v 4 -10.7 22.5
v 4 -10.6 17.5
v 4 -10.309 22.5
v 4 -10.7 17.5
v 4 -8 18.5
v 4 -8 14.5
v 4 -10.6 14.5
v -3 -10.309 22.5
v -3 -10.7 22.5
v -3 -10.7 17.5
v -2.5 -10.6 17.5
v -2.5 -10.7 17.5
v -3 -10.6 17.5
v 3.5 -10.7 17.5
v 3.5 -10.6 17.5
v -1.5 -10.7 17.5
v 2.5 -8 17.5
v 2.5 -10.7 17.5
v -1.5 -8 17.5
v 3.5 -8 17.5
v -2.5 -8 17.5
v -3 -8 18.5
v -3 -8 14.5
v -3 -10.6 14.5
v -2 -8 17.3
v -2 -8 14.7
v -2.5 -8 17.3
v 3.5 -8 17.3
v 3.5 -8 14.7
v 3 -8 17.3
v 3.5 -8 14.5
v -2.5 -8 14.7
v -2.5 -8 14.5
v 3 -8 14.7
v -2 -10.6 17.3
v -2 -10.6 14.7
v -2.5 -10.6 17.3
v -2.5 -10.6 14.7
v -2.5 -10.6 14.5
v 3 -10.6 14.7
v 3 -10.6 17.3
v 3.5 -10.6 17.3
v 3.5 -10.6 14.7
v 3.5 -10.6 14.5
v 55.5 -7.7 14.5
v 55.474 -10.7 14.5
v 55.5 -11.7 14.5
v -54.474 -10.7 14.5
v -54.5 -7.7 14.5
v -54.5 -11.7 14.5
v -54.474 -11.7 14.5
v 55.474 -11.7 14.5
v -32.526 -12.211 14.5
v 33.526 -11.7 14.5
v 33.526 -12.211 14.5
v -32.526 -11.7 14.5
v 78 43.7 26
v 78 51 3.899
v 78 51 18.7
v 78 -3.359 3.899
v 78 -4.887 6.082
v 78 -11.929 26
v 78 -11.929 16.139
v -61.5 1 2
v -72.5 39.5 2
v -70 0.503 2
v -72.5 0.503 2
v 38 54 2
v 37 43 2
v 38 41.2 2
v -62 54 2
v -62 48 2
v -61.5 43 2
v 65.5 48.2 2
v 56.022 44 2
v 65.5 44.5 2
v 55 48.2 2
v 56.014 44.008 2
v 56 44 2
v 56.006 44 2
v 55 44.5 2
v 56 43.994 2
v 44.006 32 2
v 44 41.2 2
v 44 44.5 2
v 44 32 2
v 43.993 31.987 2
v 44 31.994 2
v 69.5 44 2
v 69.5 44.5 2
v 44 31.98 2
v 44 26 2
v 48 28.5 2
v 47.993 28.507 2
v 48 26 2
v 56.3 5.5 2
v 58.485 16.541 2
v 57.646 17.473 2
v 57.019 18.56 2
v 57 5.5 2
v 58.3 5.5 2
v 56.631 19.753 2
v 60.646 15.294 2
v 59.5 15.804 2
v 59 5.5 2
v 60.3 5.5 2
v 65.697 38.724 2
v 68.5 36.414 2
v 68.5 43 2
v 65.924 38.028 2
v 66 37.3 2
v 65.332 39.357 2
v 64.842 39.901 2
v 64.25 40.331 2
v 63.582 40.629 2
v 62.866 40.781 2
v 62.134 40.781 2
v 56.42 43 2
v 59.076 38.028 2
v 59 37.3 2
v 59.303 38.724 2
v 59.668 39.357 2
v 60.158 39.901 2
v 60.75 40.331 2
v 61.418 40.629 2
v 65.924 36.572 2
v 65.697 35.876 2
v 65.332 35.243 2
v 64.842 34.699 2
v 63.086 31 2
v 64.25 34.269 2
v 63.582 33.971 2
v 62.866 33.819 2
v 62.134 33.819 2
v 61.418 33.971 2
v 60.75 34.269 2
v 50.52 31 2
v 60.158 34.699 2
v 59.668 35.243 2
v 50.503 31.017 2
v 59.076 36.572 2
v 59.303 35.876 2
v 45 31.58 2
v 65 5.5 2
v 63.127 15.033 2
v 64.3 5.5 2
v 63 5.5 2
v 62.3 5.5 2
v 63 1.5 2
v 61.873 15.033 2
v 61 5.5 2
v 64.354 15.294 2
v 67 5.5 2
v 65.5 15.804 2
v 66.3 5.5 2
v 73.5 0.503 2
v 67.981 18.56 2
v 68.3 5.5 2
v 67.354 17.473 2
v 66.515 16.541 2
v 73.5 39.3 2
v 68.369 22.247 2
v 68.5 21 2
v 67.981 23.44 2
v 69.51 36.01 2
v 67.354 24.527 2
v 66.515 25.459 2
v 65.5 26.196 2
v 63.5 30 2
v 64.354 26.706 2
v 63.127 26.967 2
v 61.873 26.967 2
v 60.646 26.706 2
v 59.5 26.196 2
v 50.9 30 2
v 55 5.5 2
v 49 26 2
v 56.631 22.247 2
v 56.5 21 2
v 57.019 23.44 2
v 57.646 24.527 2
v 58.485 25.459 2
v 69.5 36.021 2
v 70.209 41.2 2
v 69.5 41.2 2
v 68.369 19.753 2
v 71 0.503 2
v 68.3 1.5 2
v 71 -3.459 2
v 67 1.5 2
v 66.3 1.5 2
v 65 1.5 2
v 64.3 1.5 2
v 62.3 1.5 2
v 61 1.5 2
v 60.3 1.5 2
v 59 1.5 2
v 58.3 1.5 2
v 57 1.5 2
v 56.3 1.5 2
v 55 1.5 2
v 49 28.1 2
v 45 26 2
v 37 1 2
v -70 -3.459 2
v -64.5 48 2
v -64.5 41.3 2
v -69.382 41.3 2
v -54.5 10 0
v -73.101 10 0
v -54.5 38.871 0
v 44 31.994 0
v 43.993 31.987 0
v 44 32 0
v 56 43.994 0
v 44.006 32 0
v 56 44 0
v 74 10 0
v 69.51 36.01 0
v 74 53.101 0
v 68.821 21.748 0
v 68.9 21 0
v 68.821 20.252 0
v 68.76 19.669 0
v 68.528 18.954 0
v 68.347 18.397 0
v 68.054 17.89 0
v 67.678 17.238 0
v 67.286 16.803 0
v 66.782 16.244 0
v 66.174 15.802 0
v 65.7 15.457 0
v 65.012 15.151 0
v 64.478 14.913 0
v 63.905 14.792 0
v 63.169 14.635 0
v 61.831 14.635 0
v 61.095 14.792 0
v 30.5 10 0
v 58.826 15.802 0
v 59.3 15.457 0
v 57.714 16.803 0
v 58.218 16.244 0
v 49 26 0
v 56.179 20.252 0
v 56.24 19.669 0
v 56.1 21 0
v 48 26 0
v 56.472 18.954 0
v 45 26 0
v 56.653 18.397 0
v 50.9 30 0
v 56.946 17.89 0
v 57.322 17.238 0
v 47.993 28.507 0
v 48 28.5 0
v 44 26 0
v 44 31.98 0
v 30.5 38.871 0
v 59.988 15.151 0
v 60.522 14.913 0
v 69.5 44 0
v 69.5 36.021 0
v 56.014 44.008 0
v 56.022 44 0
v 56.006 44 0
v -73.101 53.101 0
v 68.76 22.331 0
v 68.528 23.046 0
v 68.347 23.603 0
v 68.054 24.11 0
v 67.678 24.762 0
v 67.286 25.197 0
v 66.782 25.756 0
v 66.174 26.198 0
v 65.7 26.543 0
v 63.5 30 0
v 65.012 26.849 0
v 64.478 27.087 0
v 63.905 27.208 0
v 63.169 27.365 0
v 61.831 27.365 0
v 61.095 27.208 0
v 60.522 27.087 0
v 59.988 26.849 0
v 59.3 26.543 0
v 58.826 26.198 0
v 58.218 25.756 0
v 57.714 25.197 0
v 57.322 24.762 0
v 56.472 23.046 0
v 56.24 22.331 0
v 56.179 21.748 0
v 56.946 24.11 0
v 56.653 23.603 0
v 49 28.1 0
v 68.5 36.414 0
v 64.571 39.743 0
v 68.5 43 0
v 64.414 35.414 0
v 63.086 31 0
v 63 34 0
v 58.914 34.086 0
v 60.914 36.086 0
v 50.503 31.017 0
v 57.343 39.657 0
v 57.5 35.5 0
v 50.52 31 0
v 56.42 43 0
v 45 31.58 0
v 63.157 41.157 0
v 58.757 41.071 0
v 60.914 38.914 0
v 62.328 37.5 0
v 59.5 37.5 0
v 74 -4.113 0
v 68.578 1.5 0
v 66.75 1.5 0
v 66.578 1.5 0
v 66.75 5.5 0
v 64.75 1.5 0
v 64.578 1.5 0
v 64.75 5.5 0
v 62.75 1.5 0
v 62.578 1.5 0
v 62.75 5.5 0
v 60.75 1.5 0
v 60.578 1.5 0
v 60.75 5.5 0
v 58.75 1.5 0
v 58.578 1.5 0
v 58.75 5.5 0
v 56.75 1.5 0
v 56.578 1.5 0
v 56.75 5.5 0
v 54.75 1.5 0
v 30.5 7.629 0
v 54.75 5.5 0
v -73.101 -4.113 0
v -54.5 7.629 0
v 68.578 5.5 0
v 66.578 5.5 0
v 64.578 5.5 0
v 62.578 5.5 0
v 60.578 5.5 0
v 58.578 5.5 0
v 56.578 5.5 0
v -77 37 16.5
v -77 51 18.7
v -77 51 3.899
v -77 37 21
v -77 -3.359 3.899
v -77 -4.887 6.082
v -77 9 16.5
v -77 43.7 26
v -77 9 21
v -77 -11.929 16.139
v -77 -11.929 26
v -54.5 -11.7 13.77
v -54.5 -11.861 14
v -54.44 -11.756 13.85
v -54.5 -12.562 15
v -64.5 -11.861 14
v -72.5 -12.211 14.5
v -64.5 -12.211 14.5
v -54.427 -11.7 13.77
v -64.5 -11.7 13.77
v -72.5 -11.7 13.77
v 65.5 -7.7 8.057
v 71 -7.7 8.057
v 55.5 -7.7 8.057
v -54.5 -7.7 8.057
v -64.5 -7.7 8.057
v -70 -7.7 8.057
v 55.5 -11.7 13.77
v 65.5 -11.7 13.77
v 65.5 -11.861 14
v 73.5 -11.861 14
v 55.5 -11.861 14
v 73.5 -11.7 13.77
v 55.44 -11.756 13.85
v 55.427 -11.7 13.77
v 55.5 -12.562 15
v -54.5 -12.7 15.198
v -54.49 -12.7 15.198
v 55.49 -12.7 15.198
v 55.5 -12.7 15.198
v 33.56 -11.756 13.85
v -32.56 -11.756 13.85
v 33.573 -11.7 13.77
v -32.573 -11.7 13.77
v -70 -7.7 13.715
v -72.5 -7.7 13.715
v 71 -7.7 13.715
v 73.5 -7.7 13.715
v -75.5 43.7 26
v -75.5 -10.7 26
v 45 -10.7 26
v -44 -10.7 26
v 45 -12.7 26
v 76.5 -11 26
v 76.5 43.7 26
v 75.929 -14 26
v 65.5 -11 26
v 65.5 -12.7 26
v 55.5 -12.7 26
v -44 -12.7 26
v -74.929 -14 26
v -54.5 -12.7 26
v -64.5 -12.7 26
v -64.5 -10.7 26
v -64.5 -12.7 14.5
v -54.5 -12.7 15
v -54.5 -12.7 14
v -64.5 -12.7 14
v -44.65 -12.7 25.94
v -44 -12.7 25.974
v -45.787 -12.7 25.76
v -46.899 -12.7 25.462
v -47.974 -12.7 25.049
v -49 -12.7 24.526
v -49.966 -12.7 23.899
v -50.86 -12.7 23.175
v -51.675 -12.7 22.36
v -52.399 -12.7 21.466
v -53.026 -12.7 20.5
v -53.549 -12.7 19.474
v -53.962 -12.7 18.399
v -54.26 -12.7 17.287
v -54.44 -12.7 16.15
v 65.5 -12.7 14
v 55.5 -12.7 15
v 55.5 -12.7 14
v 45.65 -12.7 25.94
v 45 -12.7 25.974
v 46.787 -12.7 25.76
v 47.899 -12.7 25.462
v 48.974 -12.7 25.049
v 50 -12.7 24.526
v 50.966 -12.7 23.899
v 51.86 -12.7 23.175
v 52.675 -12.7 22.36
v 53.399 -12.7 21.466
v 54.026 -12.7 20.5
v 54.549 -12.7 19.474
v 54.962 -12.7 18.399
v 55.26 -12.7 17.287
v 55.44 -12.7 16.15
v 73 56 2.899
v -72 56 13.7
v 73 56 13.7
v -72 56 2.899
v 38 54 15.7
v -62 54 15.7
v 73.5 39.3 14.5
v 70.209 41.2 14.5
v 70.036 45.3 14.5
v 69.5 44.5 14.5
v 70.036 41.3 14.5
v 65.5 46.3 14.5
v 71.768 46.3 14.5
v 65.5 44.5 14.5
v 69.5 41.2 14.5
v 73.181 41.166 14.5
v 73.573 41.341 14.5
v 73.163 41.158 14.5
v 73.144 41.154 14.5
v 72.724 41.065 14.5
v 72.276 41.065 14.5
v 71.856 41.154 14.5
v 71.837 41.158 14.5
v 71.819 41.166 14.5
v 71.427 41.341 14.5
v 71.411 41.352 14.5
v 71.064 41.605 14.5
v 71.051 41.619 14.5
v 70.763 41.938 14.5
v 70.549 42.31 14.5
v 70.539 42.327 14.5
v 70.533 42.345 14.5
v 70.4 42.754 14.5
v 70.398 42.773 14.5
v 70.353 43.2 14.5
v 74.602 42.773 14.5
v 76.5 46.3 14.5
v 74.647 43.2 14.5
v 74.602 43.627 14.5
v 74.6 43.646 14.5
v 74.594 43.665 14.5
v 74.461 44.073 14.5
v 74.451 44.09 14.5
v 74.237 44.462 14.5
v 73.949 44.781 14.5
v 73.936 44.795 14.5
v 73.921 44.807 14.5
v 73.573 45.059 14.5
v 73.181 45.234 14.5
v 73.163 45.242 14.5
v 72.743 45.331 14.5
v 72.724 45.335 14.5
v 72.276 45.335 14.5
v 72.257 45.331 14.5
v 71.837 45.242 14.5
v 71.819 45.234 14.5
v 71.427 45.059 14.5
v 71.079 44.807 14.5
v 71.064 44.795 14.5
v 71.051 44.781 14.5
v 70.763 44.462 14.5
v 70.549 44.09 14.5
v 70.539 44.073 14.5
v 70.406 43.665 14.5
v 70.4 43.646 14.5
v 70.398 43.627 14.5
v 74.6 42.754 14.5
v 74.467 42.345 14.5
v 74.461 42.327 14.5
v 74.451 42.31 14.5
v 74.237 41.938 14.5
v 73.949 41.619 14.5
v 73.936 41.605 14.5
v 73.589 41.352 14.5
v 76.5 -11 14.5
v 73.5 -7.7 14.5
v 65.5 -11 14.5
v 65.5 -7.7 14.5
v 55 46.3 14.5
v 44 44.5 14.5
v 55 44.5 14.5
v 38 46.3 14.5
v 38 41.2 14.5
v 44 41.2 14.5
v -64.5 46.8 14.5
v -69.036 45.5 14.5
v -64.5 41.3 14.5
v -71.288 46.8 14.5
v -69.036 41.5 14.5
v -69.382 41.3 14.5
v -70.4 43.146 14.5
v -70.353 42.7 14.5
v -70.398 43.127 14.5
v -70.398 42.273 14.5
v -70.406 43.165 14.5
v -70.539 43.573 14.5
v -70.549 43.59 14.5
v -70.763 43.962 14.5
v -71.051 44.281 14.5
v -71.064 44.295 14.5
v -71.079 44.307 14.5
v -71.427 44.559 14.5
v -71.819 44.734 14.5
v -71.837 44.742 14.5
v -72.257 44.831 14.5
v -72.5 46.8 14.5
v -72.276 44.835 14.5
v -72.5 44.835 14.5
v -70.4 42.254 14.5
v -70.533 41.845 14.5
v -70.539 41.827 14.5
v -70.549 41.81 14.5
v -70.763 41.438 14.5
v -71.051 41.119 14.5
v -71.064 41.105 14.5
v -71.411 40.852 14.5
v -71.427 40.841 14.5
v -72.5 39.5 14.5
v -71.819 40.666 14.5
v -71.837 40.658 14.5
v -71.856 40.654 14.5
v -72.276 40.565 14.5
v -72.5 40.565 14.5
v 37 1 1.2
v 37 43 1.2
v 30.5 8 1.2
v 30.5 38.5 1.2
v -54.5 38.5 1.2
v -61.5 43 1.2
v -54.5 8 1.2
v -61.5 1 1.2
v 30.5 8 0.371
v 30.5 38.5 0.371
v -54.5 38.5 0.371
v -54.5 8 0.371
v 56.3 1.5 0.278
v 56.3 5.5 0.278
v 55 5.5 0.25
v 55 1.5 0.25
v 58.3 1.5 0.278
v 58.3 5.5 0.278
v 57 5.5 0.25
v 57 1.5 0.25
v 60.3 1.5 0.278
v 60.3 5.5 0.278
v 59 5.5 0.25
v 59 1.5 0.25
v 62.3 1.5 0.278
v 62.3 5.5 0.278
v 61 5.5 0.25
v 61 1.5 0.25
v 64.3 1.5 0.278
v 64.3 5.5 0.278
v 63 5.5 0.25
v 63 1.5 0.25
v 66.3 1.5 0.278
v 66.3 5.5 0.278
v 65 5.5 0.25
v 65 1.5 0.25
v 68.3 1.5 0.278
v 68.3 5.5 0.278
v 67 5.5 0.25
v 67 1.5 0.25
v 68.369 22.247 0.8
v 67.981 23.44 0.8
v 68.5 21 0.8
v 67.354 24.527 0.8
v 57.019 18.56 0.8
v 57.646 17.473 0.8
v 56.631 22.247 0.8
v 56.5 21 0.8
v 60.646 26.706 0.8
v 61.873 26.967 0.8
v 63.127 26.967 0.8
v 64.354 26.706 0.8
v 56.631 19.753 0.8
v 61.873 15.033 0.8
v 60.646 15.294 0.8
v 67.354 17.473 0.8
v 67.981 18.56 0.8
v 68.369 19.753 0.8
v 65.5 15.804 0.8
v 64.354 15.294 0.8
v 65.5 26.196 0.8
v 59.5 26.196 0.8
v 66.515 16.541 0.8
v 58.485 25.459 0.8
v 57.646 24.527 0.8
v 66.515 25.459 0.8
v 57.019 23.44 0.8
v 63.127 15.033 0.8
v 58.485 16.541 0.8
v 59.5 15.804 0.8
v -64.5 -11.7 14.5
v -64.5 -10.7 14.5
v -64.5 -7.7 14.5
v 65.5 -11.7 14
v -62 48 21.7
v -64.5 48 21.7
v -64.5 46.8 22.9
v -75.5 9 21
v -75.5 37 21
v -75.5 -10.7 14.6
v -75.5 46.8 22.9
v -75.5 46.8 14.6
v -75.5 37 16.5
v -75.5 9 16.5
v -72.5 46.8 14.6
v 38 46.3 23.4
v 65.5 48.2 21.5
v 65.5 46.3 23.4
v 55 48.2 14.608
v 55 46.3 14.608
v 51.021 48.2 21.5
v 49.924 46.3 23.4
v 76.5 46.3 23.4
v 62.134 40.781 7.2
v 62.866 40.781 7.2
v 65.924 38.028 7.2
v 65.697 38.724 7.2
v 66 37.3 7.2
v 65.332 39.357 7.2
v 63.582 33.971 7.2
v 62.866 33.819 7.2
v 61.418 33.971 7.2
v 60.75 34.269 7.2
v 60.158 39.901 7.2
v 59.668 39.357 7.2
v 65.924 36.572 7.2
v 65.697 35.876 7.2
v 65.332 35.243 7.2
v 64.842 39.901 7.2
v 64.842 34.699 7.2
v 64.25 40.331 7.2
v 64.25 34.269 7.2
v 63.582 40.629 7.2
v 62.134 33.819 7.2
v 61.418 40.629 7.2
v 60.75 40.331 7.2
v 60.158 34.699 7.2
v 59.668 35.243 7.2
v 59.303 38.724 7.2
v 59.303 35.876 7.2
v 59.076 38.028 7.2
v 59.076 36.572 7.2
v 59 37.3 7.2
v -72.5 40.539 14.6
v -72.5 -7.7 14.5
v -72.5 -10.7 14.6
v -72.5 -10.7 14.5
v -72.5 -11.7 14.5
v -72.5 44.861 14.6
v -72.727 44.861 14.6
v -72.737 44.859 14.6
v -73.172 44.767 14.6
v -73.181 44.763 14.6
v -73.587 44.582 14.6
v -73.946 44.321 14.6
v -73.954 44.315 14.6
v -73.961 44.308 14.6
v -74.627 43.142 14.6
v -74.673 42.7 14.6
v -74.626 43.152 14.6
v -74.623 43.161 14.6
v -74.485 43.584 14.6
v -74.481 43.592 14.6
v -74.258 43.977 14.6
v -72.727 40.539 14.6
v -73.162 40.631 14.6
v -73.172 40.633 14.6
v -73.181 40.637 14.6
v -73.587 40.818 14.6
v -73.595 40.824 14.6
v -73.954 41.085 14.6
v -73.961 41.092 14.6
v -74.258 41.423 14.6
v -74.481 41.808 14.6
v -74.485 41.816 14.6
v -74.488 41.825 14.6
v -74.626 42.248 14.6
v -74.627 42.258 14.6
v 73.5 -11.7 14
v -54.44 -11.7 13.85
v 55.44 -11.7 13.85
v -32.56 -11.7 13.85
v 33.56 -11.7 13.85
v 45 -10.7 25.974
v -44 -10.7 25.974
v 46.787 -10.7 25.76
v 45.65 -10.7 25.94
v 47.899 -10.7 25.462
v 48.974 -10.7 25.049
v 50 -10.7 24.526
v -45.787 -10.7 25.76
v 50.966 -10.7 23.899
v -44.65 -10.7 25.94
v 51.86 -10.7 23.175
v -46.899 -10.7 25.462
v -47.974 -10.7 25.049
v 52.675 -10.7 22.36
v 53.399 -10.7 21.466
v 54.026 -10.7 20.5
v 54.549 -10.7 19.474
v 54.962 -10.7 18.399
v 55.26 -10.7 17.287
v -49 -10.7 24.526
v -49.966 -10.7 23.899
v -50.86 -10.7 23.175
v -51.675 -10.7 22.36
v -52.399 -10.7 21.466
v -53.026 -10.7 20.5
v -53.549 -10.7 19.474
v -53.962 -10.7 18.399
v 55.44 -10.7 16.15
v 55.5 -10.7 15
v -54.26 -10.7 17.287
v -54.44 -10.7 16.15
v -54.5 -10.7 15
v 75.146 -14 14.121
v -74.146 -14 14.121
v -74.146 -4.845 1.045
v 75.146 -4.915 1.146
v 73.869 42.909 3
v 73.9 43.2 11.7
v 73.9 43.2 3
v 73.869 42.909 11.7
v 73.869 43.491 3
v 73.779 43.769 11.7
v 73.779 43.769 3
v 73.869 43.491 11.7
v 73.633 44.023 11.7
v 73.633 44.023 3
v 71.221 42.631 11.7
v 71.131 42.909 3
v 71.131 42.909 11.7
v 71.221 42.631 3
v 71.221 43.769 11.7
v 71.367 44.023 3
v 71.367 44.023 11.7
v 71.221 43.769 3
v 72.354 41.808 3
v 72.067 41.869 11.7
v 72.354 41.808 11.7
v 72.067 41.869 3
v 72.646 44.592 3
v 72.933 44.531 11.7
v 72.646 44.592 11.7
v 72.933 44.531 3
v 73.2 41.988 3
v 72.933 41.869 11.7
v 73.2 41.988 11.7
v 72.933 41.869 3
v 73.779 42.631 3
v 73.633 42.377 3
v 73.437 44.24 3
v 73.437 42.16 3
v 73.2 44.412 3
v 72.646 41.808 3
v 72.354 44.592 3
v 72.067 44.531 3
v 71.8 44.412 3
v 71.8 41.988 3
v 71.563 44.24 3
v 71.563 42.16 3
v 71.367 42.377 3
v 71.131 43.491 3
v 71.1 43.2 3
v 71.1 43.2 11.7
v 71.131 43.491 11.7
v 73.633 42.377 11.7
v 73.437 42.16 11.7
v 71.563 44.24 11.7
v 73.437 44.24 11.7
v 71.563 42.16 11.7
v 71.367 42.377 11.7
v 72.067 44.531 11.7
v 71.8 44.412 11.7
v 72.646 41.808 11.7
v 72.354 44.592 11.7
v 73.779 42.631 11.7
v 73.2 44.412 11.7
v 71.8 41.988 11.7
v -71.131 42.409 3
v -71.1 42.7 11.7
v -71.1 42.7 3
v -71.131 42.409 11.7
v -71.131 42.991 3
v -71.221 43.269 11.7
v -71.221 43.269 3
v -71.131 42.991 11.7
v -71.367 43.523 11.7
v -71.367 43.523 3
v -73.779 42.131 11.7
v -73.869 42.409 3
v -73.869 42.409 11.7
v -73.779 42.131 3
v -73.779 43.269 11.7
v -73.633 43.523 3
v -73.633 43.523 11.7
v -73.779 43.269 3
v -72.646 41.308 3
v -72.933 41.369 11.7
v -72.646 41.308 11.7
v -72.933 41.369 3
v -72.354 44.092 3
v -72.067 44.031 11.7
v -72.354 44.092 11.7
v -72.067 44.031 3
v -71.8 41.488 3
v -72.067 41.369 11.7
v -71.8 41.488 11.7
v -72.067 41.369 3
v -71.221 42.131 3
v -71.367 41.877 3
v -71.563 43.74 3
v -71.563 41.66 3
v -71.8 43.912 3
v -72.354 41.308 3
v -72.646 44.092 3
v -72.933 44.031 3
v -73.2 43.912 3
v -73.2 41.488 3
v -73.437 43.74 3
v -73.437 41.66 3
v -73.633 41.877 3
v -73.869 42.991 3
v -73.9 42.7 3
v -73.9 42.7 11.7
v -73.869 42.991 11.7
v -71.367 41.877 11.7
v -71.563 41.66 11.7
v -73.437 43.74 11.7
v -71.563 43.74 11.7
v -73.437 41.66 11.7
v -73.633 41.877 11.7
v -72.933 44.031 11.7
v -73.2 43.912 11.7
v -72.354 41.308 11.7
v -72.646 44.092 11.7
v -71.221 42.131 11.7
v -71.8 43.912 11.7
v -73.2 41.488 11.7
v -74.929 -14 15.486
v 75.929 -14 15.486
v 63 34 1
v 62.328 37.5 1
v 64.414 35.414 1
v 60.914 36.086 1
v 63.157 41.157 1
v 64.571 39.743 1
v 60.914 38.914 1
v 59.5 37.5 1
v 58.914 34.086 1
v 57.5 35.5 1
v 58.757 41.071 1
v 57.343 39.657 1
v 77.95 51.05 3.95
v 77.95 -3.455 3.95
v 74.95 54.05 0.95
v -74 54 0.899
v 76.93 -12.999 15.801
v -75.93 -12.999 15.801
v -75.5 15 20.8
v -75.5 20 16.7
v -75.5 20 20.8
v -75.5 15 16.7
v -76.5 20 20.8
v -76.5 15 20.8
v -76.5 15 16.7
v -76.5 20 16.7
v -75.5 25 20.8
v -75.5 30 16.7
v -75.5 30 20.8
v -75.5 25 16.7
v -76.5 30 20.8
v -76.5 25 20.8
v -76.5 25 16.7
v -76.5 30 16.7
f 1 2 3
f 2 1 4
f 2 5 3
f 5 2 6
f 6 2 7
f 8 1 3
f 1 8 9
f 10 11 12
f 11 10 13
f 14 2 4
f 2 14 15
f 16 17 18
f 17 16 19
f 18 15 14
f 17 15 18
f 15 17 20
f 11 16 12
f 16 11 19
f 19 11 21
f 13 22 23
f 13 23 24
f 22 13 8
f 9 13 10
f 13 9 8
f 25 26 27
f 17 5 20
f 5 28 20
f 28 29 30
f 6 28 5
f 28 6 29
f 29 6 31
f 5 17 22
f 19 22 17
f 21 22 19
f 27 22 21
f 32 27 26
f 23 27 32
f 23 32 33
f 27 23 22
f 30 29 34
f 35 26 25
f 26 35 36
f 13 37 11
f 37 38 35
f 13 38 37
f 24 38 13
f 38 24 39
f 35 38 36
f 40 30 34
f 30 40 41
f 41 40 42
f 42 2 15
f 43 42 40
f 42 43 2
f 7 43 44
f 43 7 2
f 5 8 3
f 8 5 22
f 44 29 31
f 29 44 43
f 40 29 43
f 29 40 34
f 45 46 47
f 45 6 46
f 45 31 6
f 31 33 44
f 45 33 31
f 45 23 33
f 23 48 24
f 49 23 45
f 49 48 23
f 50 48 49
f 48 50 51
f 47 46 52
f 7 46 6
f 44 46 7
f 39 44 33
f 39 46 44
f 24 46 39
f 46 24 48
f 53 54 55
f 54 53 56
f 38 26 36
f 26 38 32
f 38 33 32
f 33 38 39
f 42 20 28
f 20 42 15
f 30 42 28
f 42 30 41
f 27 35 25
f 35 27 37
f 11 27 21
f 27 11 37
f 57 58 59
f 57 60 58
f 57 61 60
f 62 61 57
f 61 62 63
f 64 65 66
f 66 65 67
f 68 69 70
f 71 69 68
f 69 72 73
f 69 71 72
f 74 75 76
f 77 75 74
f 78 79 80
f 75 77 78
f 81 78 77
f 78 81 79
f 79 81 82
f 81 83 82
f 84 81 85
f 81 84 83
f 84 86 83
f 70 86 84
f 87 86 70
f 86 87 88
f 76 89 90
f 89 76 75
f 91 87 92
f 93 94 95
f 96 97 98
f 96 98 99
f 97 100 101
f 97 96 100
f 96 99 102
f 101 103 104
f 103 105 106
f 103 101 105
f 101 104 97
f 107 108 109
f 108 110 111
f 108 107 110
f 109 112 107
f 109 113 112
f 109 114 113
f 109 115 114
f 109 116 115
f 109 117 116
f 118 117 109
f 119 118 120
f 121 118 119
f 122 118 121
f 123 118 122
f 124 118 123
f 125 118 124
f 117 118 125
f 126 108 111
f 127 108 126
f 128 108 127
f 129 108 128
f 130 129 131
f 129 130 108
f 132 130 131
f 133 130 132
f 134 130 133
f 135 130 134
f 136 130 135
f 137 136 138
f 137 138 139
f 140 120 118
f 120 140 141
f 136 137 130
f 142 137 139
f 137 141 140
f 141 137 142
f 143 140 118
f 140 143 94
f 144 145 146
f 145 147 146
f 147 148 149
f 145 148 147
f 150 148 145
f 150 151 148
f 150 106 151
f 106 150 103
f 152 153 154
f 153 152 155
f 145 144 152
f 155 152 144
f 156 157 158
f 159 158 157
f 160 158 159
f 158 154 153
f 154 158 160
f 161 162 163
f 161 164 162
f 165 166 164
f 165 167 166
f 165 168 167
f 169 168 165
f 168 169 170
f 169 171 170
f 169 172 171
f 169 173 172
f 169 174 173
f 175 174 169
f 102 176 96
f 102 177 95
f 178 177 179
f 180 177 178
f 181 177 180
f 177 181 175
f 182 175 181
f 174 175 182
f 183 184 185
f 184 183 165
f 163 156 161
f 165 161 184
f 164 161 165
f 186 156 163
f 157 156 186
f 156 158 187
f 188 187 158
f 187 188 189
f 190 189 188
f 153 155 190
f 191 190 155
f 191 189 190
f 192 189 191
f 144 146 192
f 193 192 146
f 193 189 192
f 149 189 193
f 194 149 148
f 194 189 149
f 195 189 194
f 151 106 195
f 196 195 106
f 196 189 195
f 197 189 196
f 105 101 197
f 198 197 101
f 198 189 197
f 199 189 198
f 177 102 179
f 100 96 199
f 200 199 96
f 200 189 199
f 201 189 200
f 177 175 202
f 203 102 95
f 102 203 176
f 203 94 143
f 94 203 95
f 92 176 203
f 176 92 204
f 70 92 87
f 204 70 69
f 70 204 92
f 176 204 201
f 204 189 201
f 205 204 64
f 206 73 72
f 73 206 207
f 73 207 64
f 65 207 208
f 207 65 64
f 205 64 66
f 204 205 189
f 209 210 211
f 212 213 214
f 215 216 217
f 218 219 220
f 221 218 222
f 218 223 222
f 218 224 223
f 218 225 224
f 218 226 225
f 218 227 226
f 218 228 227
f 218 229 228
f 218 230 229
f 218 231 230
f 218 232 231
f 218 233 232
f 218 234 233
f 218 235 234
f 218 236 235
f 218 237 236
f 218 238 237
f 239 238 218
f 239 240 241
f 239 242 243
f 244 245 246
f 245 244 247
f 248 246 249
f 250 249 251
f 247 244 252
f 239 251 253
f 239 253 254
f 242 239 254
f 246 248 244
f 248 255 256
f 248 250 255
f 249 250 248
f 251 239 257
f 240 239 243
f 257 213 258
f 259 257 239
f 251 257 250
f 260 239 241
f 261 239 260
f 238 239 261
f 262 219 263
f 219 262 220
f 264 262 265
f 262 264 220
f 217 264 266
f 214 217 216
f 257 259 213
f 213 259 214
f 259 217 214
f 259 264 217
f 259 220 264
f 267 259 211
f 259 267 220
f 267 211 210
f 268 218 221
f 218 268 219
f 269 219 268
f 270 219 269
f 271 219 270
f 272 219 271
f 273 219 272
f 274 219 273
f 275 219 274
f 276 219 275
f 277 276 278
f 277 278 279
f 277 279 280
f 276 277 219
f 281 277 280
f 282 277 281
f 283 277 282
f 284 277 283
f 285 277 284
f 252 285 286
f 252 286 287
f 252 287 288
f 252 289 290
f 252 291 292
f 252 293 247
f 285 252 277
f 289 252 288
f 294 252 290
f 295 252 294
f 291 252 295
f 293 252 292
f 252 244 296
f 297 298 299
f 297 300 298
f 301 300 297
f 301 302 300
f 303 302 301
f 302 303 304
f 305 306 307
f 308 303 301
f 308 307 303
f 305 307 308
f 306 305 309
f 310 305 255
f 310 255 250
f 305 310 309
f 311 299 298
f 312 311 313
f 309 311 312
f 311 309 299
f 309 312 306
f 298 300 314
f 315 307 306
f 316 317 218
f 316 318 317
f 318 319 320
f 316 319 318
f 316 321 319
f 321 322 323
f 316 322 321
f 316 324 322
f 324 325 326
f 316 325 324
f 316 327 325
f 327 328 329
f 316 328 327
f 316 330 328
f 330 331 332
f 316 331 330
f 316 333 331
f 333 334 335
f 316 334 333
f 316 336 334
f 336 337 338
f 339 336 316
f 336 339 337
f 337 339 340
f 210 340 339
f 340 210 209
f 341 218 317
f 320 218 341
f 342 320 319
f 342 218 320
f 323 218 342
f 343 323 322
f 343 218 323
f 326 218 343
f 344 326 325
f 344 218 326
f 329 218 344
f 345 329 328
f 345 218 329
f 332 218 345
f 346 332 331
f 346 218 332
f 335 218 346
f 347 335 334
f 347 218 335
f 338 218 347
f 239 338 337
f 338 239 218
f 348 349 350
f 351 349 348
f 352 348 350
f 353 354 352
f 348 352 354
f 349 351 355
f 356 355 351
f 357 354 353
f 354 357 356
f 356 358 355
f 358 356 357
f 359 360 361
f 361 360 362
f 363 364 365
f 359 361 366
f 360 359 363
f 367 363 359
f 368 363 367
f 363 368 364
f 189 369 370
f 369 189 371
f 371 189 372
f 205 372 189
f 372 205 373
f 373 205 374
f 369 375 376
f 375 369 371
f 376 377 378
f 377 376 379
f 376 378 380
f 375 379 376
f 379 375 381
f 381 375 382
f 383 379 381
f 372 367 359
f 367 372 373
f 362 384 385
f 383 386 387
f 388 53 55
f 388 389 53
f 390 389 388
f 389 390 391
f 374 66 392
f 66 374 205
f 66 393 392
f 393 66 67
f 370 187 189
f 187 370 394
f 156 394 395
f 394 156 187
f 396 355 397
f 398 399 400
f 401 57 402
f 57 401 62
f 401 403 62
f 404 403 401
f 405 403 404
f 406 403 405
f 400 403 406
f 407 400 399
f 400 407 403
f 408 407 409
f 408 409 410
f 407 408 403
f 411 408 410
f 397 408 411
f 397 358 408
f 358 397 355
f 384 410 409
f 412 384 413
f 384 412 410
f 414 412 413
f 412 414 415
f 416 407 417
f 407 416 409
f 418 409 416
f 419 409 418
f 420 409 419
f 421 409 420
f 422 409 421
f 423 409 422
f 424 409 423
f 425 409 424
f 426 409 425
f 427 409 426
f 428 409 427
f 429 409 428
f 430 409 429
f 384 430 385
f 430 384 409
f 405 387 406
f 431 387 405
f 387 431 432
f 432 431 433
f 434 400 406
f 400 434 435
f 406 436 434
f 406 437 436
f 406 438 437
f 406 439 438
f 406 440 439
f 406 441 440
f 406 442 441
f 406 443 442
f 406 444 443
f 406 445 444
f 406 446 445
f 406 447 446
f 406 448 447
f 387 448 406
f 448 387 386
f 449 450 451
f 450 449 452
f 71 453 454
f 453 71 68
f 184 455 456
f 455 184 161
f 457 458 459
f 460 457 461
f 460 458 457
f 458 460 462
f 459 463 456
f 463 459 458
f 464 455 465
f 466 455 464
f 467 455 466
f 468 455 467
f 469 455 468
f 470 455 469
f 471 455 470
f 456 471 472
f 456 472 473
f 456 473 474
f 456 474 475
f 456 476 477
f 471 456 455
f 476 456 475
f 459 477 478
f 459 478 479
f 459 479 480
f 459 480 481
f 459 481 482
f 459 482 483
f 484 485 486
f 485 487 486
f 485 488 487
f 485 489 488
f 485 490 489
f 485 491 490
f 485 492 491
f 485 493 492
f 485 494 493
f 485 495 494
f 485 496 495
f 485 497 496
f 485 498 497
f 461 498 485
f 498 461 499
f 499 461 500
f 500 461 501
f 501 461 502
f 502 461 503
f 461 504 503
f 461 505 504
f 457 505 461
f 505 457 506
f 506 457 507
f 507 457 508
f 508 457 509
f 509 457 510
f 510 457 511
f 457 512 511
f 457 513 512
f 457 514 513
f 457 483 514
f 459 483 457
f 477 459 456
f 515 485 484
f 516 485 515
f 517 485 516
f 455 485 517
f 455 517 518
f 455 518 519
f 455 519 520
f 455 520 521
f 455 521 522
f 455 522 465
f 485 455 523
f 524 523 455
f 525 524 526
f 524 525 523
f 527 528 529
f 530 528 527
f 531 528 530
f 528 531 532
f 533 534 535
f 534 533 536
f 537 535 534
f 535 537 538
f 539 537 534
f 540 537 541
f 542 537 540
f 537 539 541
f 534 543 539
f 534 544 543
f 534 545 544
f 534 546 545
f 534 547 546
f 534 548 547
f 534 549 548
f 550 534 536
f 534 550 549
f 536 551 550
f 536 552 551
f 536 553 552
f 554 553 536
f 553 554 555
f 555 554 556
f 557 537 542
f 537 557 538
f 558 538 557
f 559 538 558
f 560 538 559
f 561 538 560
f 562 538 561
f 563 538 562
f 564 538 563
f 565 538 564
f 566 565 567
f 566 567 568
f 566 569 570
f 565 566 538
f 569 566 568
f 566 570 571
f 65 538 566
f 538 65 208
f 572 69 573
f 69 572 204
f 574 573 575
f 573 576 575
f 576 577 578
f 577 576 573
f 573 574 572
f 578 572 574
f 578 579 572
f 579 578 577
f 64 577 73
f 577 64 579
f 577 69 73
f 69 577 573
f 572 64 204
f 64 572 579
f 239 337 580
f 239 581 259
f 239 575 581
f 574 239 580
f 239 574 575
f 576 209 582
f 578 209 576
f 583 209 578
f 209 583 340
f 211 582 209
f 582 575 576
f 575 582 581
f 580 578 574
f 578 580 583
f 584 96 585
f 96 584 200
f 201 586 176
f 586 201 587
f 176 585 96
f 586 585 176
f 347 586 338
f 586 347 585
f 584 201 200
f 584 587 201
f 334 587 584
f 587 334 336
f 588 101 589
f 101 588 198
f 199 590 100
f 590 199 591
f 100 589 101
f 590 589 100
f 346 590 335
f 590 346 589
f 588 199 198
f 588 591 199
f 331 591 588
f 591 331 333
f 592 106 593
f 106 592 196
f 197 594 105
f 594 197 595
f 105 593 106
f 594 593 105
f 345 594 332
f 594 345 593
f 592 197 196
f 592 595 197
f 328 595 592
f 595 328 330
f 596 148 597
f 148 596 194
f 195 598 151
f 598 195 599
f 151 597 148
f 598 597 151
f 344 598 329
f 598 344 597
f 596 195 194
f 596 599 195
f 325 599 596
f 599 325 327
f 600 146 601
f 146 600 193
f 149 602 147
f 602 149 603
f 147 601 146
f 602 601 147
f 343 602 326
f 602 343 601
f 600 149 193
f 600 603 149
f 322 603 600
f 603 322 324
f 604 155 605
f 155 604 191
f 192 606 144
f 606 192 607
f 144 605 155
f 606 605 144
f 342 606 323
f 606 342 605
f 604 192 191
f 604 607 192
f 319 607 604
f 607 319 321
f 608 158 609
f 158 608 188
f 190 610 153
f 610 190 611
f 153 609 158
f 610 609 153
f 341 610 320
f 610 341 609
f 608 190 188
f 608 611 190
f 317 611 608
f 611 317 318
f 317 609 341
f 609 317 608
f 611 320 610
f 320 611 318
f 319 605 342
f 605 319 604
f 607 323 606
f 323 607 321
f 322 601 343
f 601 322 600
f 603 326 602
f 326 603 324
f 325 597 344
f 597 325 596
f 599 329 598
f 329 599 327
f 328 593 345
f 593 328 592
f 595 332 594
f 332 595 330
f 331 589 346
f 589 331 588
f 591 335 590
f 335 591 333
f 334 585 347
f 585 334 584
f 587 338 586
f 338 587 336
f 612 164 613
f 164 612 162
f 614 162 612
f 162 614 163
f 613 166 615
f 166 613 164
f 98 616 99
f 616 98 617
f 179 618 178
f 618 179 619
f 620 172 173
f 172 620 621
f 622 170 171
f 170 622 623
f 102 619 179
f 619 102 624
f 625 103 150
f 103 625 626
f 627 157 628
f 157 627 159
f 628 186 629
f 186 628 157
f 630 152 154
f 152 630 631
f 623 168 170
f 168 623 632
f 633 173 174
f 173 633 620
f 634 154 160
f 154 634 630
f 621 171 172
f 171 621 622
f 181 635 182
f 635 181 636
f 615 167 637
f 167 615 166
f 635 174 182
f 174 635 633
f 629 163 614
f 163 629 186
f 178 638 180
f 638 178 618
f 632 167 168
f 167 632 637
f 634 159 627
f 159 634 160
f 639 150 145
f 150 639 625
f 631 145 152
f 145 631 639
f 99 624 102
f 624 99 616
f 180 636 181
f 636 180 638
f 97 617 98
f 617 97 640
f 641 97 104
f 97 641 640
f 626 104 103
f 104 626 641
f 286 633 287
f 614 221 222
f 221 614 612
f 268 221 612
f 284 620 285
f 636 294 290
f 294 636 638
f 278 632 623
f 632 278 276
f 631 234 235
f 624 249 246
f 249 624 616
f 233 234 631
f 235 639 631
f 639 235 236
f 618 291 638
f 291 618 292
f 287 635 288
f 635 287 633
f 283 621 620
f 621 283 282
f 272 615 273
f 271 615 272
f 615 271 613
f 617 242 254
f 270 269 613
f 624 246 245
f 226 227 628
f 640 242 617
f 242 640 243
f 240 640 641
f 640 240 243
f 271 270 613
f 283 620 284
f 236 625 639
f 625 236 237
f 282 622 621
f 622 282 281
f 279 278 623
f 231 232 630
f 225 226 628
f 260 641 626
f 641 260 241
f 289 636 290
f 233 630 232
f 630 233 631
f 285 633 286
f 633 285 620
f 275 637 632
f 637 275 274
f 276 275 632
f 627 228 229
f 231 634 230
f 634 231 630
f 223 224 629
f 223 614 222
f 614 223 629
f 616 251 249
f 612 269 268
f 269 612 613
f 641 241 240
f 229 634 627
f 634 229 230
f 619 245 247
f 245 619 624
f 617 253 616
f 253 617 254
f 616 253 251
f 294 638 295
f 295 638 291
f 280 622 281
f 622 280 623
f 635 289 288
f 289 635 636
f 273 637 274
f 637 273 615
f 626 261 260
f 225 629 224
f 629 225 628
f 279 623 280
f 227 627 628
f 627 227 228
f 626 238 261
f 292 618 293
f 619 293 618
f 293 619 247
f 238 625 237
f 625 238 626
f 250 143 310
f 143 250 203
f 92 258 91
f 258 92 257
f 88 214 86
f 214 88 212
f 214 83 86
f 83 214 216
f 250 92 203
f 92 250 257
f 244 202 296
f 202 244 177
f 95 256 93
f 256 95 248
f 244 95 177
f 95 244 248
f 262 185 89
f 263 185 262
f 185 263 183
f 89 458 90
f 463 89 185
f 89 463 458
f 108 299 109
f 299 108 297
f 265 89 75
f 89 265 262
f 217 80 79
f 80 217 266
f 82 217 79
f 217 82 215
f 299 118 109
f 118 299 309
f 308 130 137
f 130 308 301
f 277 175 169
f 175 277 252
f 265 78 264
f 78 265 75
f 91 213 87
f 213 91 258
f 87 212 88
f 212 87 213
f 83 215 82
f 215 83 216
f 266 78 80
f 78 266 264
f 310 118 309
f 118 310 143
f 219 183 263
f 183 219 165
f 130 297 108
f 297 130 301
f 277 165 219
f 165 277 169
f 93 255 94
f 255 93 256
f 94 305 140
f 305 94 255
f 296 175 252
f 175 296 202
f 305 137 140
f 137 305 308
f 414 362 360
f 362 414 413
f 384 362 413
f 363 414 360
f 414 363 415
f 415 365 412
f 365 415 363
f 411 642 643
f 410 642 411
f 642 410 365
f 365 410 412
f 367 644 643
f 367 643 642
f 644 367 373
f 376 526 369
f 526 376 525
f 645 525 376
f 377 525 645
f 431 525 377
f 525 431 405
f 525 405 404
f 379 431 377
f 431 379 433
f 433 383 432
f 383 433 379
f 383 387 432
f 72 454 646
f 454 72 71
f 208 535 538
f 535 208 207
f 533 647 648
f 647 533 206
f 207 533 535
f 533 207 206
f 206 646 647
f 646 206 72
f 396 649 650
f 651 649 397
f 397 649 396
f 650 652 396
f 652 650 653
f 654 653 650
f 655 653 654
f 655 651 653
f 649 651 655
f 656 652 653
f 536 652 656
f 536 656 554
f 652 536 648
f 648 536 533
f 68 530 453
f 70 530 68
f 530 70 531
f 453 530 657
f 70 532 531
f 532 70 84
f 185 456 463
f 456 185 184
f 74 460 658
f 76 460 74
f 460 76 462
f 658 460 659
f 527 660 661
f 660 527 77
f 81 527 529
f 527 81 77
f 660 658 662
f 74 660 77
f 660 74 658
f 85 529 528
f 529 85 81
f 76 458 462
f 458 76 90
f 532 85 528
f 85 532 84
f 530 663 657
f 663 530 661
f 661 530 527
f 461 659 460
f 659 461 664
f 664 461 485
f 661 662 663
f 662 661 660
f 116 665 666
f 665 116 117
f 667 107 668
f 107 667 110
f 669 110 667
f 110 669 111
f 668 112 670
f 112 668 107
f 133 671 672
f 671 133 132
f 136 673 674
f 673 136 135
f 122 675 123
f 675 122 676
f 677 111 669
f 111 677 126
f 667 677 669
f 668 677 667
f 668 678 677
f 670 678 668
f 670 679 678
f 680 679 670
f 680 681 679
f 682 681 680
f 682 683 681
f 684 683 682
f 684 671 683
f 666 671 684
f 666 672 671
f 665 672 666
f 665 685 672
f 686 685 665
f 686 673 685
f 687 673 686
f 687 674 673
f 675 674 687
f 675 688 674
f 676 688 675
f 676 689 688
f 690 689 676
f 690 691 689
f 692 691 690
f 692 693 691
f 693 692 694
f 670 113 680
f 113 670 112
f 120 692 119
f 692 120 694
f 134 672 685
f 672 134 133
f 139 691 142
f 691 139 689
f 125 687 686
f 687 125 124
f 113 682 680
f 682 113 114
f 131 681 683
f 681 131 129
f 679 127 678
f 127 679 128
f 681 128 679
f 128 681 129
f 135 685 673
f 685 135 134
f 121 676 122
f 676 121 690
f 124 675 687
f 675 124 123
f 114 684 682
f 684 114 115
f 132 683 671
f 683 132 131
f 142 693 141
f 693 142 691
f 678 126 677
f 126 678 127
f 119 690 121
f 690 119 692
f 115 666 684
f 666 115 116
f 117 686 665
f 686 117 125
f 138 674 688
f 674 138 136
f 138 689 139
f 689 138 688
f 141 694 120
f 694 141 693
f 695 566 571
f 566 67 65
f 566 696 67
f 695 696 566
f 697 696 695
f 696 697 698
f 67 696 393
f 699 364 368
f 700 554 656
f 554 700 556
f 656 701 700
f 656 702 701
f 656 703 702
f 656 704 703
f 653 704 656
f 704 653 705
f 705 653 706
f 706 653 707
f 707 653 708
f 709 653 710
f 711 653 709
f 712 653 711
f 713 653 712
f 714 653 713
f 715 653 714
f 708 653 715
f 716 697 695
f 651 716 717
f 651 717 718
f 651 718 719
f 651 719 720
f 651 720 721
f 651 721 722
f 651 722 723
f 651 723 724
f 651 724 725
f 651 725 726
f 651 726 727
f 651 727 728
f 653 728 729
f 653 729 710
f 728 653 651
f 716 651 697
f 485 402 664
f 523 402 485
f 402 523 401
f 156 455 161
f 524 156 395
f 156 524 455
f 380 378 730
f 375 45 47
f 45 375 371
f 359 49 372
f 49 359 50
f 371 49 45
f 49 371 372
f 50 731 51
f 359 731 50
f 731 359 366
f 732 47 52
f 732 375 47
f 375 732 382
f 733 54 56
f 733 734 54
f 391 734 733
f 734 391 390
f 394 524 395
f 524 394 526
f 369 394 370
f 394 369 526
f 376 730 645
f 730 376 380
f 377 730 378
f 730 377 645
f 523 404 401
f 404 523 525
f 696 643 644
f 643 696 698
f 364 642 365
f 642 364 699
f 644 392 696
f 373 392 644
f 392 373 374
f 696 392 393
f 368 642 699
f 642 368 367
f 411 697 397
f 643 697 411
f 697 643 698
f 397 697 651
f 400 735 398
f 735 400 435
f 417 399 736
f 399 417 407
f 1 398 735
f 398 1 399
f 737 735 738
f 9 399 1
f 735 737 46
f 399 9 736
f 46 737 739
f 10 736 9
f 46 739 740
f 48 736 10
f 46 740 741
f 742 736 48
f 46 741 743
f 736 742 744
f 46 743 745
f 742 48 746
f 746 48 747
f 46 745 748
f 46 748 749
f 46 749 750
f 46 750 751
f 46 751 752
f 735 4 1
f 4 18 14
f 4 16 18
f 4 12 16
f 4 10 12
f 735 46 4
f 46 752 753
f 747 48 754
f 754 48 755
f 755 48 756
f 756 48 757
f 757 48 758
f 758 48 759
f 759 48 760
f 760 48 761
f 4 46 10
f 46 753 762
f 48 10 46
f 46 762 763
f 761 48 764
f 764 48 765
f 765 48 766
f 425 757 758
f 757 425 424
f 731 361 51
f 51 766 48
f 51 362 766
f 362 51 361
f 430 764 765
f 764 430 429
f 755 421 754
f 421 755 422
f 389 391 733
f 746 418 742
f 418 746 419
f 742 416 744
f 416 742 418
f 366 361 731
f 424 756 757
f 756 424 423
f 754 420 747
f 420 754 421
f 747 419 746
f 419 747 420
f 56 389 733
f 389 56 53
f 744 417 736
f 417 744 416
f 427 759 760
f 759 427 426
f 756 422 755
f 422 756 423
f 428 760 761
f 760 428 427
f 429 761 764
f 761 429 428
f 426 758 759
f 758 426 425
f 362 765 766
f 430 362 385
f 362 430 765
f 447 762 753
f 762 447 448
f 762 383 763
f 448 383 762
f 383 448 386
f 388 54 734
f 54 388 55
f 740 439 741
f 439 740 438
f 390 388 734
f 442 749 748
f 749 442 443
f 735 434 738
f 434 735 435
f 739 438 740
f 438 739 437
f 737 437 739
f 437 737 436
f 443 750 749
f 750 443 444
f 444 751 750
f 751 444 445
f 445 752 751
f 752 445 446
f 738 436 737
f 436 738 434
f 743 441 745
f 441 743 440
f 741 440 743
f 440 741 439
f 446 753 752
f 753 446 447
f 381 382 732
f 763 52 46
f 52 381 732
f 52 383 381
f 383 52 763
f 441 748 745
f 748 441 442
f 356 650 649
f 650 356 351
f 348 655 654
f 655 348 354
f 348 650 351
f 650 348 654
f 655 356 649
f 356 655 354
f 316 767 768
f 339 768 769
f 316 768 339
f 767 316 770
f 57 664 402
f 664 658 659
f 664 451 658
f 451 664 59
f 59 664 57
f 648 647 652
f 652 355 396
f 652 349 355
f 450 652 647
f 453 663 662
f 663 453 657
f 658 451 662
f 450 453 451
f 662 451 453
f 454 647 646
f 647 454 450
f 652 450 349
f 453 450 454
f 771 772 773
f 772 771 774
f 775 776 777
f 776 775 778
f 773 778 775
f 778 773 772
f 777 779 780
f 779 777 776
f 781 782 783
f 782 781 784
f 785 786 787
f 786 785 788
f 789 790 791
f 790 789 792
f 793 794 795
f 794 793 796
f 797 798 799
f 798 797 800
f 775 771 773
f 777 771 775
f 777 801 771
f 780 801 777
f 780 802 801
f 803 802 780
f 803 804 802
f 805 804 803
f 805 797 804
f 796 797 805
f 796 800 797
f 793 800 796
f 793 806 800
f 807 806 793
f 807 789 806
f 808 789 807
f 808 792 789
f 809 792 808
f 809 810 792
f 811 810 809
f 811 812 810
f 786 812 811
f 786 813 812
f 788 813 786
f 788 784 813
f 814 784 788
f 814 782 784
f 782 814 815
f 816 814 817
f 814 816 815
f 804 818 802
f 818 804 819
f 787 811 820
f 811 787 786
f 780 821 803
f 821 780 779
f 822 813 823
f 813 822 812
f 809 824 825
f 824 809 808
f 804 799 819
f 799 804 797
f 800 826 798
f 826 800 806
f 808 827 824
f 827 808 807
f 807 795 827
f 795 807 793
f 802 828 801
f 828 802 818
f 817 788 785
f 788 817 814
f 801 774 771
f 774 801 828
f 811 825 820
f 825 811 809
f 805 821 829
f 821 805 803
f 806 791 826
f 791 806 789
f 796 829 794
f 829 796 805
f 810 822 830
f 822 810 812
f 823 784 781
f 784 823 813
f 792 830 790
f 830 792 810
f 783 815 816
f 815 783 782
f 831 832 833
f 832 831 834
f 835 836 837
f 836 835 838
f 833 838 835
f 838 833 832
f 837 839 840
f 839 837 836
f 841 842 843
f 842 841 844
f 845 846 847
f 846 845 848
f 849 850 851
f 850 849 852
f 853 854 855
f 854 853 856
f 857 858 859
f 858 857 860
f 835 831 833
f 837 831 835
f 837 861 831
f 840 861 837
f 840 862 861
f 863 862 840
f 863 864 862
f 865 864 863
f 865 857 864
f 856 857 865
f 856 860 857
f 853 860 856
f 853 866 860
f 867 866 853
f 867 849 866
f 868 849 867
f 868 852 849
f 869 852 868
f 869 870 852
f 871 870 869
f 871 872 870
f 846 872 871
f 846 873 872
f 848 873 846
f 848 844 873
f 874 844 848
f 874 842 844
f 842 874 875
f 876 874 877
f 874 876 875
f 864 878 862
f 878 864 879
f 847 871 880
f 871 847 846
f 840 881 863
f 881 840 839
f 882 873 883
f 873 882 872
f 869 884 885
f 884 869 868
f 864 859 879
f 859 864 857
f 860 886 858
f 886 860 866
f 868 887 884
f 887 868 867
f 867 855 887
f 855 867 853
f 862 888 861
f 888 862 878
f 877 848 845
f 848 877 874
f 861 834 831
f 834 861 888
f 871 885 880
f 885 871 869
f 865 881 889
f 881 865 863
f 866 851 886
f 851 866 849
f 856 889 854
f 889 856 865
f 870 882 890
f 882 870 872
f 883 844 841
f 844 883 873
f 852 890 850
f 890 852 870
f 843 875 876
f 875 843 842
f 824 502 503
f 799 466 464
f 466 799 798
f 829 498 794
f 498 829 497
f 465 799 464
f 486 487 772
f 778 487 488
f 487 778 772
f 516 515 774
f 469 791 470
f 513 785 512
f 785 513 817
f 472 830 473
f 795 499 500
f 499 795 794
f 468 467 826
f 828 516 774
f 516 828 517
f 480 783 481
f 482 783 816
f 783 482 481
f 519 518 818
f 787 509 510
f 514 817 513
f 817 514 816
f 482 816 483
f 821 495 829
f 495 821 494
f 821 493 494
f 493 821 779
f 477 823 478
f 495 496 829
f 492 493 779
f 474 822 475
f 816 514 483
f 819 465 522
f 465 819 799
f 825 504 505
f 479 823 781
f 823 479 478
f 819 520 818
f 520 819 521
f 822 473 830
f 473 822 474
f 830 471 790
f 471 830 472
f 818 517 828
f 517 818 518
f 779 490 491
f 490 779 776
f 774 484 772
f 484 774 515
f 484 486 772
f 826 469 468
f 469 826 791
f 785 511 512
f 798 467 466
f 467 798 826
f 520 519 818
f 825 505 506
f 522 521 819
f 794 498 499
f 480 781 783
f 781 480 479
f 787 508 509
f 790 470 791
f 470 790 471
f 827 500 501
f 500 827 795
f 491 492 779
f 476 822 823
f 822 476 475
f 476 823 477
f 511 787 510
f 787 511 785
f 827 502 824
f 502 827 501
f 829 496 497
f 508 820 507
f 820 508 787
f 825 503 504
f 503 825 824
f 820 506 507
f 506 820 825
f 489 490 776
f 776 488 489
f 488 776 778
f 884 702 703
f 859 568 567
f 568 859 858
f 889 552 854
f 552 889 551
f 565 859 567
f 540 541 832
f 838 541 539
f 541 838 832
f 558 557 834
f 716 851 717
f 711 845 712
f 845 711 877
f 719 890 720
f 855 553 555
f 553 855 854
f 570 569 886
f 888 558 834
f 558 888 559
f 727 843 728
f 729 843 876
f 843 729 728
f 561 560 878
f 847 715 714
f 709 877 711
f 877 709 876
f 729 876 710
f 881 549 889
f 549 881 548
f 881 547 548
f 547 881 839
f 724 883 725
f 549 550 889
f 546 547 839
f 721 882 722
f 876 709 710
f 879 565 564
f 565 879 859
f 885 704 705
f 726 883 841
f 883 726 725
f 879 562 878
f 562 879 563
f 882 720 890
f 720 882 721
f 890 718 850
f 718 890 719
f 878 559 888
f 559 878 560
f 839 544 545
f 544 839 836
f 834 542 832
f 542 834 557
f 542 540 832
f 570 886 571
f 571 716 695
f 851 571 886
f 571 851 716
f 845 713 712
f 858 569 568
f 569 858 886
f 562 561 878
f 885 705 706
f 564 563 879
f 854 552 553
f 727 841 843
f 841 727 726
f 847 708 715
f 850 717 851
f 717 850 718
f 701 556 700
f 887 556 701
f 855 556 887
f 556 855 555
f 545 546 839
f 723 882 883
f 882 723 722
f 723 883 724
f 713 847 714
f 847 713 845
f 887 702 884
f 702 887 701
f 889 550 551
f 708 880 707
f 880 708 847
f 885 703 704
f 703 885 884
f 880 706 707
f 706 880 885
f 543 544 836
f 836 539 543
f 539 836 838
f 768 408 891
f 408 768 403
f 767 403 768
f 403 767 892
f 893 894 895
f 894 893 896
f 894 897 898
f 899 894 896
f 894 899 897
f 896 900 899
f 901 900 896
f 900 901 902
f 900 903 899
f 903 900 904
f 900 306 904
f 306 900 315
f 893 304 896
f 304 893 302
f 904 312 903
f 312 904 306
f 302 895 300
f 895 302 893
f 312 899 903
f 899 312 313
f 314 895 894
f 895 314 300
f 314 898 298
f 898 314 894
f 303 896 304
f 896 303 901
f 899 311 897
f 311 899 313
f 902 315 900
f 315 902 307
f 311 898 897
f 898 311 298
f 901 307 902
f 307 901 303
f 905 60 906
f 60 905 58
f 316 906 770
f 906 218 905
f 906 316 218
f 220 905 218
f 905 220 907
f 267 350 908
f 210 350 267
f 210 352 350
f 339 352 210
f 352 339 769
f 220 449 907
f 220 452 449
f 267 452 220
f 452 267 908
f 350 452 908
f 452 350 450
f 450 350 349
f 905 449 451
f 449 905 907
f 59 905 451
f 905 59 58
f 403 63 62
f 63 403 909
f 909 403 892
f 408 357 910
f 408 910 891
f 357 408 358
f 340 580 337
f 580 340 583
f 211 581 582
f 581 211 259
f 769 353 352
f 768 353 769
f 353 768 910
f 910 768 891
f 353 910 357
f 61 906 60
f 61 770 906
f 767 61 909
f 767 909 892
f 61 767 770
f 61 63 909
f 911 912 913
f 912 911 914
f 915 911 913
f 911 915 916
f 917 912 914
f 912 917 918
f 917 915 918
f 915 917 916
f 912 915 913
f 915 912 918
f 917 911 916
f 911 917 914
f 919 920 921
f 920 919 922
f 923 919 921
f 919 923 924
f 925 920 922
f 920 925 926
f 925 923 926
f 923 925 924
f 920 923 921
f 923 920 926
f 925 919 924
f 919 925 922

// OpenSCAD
// PRUSA iteration4
// LCD cover
// GNU GPL v3
// Josef Průša <iam@josefprusa.cz> and contributors
// http://www.reprap.org/wiki/Prusa_Mendel
// http://prusamendel.org


module main_body()
{
    difference() 
    {
        union() 
        {
            // main body
            translate( [ -77 , -4.5 , 0 ] ) cube( [ 155 , 59.8 , 2 ] ); 
            translate( [ -77 , -4.5 , 0 ] ) rotate([35,0,0]) cube( [ 155 , 2 , 20.08 ] );
            translate( [ -77 , -3.5 , -1 ] ) rotate([35,0,0]) cube( [ 7 , 5 , 15 ] );
            translate( [ 71 , -3.5 , -1 ] ) rotate([35,0,0]) cube( [ 7 , 5 , 15 ] );
            translate( [ -77 , -14.7 , 14.2 ] )  cube( [ 155 , 2 , 11.8 ] );
            translate( [ -77 , 54 , 0 ] ) cube( [ 155 , 2 , 17 ] );
            
            // M3 hole body
            translate( [ 73.5 , 43.3 , 0.5 ] ) rotate([0,0,90])  cylinder( h = 14, r = 4, $fn=6);  
            translate( [ -72.5 , 43.5 , 0.5 ] ) rotate([0,0,90])  cylinder( h = 14, r = 4, $fn=6);  
        }
        
        // LCD window
        translate( [ -61.5 , 1 , 1.2 ] ) cube( [ 98.5 , 42 , 10 ] ); 
        translate( [ -54.5 , 8 , -1 ] ) cube( [ 85 , 30.5 , 10 ] );  

        // buzzer holes
        translate( [ 55 , 1.5 , -1 ] ) cube( [ 1.3 , 4 , 10 ] );  
        translate( [ 57 , 1.5 , -1 ] ) cube( [ 1.3 , 4 , 10 ] );  
        translate( [ 59 , 1.5 , -1 ] ) cube( [ 1.3 , 4 , 10 ] );  
        translate( [ 61 , 1.5 , -1 ] ) cube( [ 1.3 , 4 , 10 ] );  
        translate( [ 63 , 1.5 , -1 ] ) cube( [ 1.3 , 4 , 10 ] );  
        translate( [ 65 , 1.5 , -1 ] ) cube( [ 1.3 , 4 , 10 ] );  
        translate( [ 67 , 1.5 , -1 ] ) cube( [ 1.3 , 4 , 10 ] );  

        // buzzer holes corners
        translate( [ 66.25 , 1.5 , -0.5 ] ) rotate([0,45,0]) cube( [ 2 , 4 , 2 ] );  
        translate( [ 64.25 , 1.5 , -0.5 ] ) rotate([0,45,0]) cube( [ 2 , 4 , 2 ] );  
        translate( [ 62.25 , 1.5 , -0.5 ] ) rotate([0,45,0]) cube( [ 2 , 4 , 2 ] );  
        translate( [ 60.25 , 1.5 , -0.5 ] ) rotate([0,45,0]) cube( [ 2 , 4 , 2 ] );  
        translate( [ 58.25 , 1.5 , -0.5 ] ) rotate([0,45,0]) cube( [ 2 , 4 , 2 ] );  
        translate( [ 56.25 , 1.5 , -0.5 ] ) rotate([0,45,0]) cube( [ 2 , 4 , 2 ] );  
        translate( [ 54.25 , 1.5 , -0.5 ] ) rotate([0,45,0]) cube( [ 2 , 4 , 2 ] );  

        // knob hole
        translate( [ 62.5 , 21 , -1 ] ) cylinder( h = 10, r = 6, $fn=30);
        translate( [ 62.5 , 21 , -1.2 ] ) cylinder( h = 2, r1 = 7, r2 = 6, $fn=30);

        // reset button cutout
        translate( [ 44 , 26 , -1 ] ) cube( [ 1 , 6 , 9 ] );  
        translate( [ 48 , 26 , -1 ] ) cube( [ 1 , 2.5 , 9 ] );  
        translate( [ 68.5 , 36 , -1 ] ) cube( [ 1 , 8 , 9 ] );  
        translate( [ 56 , 43 , -1 ] ) cube( [ 13.5 , 1 , 9 ] ); 
        translate( [ 50.5 , 30 , -1 ] ) cube( [ 13 , 1 , 9 ] ); 
        translate( [ 44.7 , 31.28 , -1 ] ) rotate([0,0,45]) cube( [ 17 , 1 , 9 ] );  
        translate( [ 63.5 , 30 , -1 ] ) rotate([0,0,45]) cube( [ 8.5 , 1 , 9 ] );  
        translate( [ 48.7 , 27.8 , -1 ] ) rotate([0,0,45]) cube( [ 3.55 , 1 , 9 ] );

        // rear support cutout
        translate( [ -64.5 , -12.7 , 14 ] ) cube( [ 10 , 3 , 16 ] );  
        translate( [ 55.5 , -12.7 , 14 ] ) cube( [ 10 , 3 , 16 ] );  

    }
}

module pcb_clip()
{
    difference()
    {
    union()
        {
            translate( [ -3 , -12 , 17.5 ] ) cube( [ 7 , 4 , 5 ] ); 
            translate( [ -3 , -10.6 , 12.5 ] ) cube( [ 1 , 2.6 , 7 ] );  
            translate( [ 3 , -10.6 , 12.5 ] ) cube( [ 1 , 2.6 , 7 ] );  
        }
        translate( [ -4 , -8 , 18.5 ] ) rotate([30,0,0]) cube( [ 10 , 6 , 6 ] );  
        translate( [ 2.5 , -12 , 14.5 ] ) cube( [ 1 , 4 , 0.2 ] );  
        translate( [ -2.5 , -12 , 14.5 ] ) cube( [ 1 , 4 , 0.2 ] );  
        translate( [ 2.5 , -12 , 17.3 ] ) cube( [ 1 , 4 , 0.2 ] );  
        translate( [ -2.5 , -12 , 17.3 ] ) cube( [ 1 , 4 , 0.2 ] );          
    }
}



difference()
{
    union()
    {

    pcb_clip();
    main_body();

    // reset button
    translate( [ 62.5 , 37.3 , 0 ] ) cylinder( h = 7.2, r = 3.5, $fn=30); 

    //left side
    translate( [ -77 , -14.7 , 0 ] ) cube( [ 1.5 , 70.7 , 26 ] );  
    translate( [ -76.5 , -15 , 0 ] ) cube( [ 4 , 70 , 14.6 ] );  

    //right side
    translate( [ 76.5 , -14.7 , 0 ] ) cube( [ 1.5 , 70.7 , 26 ] ); 
    translate( [ 73.5 , -14 , 0 ] ) cube( [ 4 , 70 , 14.5 ] );  

    //rear side reinforcement
    translate( [ -54.5 , -11.7 , 8 ] ) cube( [ 110 , 4 , 6.5 ] );  
    translate( [ 65.5 , -11.7 , 8 ] ) cube( [ 12 , 4 , 6.5 ] );  
    translate( [ 65.5 , -13 , 14 ] ) cube( [ 12 , 2 , 12 ] );  
    translate( [ -76.5 , -11.7 , 8 ] ) cube( [ 12 , 4 , 6.5 ] );  
    translate( [ -76.5 , -14.7 , 14.5 ] ) cube( [ 12 , 4 , 11.5 ] );  
    translate( [ -44 , -14.7 , 14.5 ] ) cube( [ 89 , 4 , 11.5 ] );  
    translate( [ -43.5 , -10.7 , 15 ] ) rotate([90,0,0]) cylinder( h = 2, r = 11, $fn=60);  
    translate( [ 44.5 , -10.7 , 15 ] ) rotate([90,0,0]) cylinder( h = 2, r = 11, $fn=60);  

    //front left side reinforcement
    difference()
    {
        union()
            {
                translate( [ -77 , 41.3 , 0 ] ) cube( [ 15 , 14 , 25 ] );  
                translate( [ -77 , 46.3 , 14 ] ) cube( [ 15 , 9 , 3 ] );    
            }
        translate( [ -64.5 , 40 , -3 ] ) cube( [ 4 , 8 , 40 ] );  
        translate( [ -75.5 , 40.3 , 14.5 ] ) cube( [15 , 6.5 , 25 ] ); 
    }


    //front right side reinforcement
    difference()
        {
            translate( [ 38 , 41.2 , 0 ] ) cube( [ 40 , 14 , 26 ] );  
            translate( [ 55 , 44.5 , 0 ] ) cube( [ 10.5 , 3.7 , 30 ] );  
            translate( [ 44 , 39.5 , 0 ] ) cube( [ 25.5 , 5 , 30 ] );  
            translate( [ 35 , 39.3 , 14.5 ] ) cube( [ 42.5 , 7 , 15 ] );  
            translate( [ 49 , 43.2 , 25 ] ) rotate([0,60,0]) cube( [ 12 , 5 , 10 ] );  
        }
    }

    // SD card opening
    translate( [ -80 , 9 , 16.5 ] ) cube( [ 10 , 28 , 4.5 ] );  

    // front and rear angle
    translate( [ -81 , -9.3 , -17 ] ) rotate([35,0,0]) cube( [ 164 , 14 , 54.08 ] );  
    translate( [ -78 , 72.7 , -3 ] ) rotate([45,0,0]) cube( [ 160 , 14 , 54.08 ] );  

    // M3 screw thread
    translate( [ 72.5 , 43.2 , 3 ] ) cylinder( h = 20, r = 1.4, $fn=30);  
    translate( [ -72.5 , 42.7 , 3 ] ) cylinder( h = 20, r = 1.4, $fn=30); 
    translate( [ 72.5 , 43.2 , 11.7 ] ) cylinder( h = 3, r1 = 1.4, r2=2.2, $fn=30);  
    translate( [ -72.5 , 42.7 , 11.7 ] ) cylinder( h = 3, r1 = 1.4, r2=2.2, $fn=30);  

    // front cleanup
    translate( [ -100 , -64 , 0 ] ) cube( [ 200 , 50 , 50 ] ); 

    // X sign on reset button
    translate( [ 63 , 34 , -1 ] ) rotate([0,0,45]) cube( [ 2, 8, 2 ] );  
    translate( [ 57.5 , 35.5 , -1 ] ) rotate([0,0,-45]) cube( [ 2, 8, 2 ] );  

    // corners
    translate( [ 73 , -5 , -1 ] ) rotate([0,45,0]) cube( [ 7, 80, 7 ] );  
    translate( [ -82 , -5 , -1 ] ) rotate([0,45,0]) cube( [ 7, 80, 7 ] );  

    translate( [ -82 , 58 , -5 ] ) rotate([45,0,0]) cube( [ 200, 7, 7 ] );  
    translate( [ -77 , 51 , -4 ] ) rotate([0,0,45]) cube( [ 8, 8, 50 ] );  
    translate( [ 78 , 51 , -4 ] ) rotate([0,0,45]) cube( [ 8, 8, 50 ] );  
    translate( [ 78 , -19 , -4 ] ) rotate([0,0,45]) cube( [ 5, 5, 50 ] );  
    translate( [ -77 , -19 , -4 ] ) rotate([0,0,45]) cube( [ 5, 5, 50 ] );  

    // LCD corners
    translate( [ -54.5 , 9.5 , -5.2 ] ) rotate([45,0,0]) cube( [ 85 , 5 , 5 ] );  // LCD window
    translate( [ -54.5 , 37 , -5.2 ] ) rotate([45,0,0]) cube( [ 85 , 5 , 5 ] );  // LCD window
    rotate([35,0,0]) translate( [ -78 , -8 , -4 ] ) rotate([0,0,45]) cube( [ 6, 6, 50 ] );  
    rotate([35,0,0]) translate( [ 79 , -8 , -4 ] ) rotate([0,0,45]) cube( [ 6, 6, 50 ] );  
    translate( [ -100 , -40 , -50 ] ) cube( [ 200 , 50 , 50 ] );     
    
}

// print support for SD card opening
translate( [ -76.5 , 15 , 16.70 ] ) cube( [ 1 , 5 , 4.1 ] );
translate( [ -76.5 , 25 , 16.70 ] ) cube( [ 1 , 5 , 4.1 ] );
